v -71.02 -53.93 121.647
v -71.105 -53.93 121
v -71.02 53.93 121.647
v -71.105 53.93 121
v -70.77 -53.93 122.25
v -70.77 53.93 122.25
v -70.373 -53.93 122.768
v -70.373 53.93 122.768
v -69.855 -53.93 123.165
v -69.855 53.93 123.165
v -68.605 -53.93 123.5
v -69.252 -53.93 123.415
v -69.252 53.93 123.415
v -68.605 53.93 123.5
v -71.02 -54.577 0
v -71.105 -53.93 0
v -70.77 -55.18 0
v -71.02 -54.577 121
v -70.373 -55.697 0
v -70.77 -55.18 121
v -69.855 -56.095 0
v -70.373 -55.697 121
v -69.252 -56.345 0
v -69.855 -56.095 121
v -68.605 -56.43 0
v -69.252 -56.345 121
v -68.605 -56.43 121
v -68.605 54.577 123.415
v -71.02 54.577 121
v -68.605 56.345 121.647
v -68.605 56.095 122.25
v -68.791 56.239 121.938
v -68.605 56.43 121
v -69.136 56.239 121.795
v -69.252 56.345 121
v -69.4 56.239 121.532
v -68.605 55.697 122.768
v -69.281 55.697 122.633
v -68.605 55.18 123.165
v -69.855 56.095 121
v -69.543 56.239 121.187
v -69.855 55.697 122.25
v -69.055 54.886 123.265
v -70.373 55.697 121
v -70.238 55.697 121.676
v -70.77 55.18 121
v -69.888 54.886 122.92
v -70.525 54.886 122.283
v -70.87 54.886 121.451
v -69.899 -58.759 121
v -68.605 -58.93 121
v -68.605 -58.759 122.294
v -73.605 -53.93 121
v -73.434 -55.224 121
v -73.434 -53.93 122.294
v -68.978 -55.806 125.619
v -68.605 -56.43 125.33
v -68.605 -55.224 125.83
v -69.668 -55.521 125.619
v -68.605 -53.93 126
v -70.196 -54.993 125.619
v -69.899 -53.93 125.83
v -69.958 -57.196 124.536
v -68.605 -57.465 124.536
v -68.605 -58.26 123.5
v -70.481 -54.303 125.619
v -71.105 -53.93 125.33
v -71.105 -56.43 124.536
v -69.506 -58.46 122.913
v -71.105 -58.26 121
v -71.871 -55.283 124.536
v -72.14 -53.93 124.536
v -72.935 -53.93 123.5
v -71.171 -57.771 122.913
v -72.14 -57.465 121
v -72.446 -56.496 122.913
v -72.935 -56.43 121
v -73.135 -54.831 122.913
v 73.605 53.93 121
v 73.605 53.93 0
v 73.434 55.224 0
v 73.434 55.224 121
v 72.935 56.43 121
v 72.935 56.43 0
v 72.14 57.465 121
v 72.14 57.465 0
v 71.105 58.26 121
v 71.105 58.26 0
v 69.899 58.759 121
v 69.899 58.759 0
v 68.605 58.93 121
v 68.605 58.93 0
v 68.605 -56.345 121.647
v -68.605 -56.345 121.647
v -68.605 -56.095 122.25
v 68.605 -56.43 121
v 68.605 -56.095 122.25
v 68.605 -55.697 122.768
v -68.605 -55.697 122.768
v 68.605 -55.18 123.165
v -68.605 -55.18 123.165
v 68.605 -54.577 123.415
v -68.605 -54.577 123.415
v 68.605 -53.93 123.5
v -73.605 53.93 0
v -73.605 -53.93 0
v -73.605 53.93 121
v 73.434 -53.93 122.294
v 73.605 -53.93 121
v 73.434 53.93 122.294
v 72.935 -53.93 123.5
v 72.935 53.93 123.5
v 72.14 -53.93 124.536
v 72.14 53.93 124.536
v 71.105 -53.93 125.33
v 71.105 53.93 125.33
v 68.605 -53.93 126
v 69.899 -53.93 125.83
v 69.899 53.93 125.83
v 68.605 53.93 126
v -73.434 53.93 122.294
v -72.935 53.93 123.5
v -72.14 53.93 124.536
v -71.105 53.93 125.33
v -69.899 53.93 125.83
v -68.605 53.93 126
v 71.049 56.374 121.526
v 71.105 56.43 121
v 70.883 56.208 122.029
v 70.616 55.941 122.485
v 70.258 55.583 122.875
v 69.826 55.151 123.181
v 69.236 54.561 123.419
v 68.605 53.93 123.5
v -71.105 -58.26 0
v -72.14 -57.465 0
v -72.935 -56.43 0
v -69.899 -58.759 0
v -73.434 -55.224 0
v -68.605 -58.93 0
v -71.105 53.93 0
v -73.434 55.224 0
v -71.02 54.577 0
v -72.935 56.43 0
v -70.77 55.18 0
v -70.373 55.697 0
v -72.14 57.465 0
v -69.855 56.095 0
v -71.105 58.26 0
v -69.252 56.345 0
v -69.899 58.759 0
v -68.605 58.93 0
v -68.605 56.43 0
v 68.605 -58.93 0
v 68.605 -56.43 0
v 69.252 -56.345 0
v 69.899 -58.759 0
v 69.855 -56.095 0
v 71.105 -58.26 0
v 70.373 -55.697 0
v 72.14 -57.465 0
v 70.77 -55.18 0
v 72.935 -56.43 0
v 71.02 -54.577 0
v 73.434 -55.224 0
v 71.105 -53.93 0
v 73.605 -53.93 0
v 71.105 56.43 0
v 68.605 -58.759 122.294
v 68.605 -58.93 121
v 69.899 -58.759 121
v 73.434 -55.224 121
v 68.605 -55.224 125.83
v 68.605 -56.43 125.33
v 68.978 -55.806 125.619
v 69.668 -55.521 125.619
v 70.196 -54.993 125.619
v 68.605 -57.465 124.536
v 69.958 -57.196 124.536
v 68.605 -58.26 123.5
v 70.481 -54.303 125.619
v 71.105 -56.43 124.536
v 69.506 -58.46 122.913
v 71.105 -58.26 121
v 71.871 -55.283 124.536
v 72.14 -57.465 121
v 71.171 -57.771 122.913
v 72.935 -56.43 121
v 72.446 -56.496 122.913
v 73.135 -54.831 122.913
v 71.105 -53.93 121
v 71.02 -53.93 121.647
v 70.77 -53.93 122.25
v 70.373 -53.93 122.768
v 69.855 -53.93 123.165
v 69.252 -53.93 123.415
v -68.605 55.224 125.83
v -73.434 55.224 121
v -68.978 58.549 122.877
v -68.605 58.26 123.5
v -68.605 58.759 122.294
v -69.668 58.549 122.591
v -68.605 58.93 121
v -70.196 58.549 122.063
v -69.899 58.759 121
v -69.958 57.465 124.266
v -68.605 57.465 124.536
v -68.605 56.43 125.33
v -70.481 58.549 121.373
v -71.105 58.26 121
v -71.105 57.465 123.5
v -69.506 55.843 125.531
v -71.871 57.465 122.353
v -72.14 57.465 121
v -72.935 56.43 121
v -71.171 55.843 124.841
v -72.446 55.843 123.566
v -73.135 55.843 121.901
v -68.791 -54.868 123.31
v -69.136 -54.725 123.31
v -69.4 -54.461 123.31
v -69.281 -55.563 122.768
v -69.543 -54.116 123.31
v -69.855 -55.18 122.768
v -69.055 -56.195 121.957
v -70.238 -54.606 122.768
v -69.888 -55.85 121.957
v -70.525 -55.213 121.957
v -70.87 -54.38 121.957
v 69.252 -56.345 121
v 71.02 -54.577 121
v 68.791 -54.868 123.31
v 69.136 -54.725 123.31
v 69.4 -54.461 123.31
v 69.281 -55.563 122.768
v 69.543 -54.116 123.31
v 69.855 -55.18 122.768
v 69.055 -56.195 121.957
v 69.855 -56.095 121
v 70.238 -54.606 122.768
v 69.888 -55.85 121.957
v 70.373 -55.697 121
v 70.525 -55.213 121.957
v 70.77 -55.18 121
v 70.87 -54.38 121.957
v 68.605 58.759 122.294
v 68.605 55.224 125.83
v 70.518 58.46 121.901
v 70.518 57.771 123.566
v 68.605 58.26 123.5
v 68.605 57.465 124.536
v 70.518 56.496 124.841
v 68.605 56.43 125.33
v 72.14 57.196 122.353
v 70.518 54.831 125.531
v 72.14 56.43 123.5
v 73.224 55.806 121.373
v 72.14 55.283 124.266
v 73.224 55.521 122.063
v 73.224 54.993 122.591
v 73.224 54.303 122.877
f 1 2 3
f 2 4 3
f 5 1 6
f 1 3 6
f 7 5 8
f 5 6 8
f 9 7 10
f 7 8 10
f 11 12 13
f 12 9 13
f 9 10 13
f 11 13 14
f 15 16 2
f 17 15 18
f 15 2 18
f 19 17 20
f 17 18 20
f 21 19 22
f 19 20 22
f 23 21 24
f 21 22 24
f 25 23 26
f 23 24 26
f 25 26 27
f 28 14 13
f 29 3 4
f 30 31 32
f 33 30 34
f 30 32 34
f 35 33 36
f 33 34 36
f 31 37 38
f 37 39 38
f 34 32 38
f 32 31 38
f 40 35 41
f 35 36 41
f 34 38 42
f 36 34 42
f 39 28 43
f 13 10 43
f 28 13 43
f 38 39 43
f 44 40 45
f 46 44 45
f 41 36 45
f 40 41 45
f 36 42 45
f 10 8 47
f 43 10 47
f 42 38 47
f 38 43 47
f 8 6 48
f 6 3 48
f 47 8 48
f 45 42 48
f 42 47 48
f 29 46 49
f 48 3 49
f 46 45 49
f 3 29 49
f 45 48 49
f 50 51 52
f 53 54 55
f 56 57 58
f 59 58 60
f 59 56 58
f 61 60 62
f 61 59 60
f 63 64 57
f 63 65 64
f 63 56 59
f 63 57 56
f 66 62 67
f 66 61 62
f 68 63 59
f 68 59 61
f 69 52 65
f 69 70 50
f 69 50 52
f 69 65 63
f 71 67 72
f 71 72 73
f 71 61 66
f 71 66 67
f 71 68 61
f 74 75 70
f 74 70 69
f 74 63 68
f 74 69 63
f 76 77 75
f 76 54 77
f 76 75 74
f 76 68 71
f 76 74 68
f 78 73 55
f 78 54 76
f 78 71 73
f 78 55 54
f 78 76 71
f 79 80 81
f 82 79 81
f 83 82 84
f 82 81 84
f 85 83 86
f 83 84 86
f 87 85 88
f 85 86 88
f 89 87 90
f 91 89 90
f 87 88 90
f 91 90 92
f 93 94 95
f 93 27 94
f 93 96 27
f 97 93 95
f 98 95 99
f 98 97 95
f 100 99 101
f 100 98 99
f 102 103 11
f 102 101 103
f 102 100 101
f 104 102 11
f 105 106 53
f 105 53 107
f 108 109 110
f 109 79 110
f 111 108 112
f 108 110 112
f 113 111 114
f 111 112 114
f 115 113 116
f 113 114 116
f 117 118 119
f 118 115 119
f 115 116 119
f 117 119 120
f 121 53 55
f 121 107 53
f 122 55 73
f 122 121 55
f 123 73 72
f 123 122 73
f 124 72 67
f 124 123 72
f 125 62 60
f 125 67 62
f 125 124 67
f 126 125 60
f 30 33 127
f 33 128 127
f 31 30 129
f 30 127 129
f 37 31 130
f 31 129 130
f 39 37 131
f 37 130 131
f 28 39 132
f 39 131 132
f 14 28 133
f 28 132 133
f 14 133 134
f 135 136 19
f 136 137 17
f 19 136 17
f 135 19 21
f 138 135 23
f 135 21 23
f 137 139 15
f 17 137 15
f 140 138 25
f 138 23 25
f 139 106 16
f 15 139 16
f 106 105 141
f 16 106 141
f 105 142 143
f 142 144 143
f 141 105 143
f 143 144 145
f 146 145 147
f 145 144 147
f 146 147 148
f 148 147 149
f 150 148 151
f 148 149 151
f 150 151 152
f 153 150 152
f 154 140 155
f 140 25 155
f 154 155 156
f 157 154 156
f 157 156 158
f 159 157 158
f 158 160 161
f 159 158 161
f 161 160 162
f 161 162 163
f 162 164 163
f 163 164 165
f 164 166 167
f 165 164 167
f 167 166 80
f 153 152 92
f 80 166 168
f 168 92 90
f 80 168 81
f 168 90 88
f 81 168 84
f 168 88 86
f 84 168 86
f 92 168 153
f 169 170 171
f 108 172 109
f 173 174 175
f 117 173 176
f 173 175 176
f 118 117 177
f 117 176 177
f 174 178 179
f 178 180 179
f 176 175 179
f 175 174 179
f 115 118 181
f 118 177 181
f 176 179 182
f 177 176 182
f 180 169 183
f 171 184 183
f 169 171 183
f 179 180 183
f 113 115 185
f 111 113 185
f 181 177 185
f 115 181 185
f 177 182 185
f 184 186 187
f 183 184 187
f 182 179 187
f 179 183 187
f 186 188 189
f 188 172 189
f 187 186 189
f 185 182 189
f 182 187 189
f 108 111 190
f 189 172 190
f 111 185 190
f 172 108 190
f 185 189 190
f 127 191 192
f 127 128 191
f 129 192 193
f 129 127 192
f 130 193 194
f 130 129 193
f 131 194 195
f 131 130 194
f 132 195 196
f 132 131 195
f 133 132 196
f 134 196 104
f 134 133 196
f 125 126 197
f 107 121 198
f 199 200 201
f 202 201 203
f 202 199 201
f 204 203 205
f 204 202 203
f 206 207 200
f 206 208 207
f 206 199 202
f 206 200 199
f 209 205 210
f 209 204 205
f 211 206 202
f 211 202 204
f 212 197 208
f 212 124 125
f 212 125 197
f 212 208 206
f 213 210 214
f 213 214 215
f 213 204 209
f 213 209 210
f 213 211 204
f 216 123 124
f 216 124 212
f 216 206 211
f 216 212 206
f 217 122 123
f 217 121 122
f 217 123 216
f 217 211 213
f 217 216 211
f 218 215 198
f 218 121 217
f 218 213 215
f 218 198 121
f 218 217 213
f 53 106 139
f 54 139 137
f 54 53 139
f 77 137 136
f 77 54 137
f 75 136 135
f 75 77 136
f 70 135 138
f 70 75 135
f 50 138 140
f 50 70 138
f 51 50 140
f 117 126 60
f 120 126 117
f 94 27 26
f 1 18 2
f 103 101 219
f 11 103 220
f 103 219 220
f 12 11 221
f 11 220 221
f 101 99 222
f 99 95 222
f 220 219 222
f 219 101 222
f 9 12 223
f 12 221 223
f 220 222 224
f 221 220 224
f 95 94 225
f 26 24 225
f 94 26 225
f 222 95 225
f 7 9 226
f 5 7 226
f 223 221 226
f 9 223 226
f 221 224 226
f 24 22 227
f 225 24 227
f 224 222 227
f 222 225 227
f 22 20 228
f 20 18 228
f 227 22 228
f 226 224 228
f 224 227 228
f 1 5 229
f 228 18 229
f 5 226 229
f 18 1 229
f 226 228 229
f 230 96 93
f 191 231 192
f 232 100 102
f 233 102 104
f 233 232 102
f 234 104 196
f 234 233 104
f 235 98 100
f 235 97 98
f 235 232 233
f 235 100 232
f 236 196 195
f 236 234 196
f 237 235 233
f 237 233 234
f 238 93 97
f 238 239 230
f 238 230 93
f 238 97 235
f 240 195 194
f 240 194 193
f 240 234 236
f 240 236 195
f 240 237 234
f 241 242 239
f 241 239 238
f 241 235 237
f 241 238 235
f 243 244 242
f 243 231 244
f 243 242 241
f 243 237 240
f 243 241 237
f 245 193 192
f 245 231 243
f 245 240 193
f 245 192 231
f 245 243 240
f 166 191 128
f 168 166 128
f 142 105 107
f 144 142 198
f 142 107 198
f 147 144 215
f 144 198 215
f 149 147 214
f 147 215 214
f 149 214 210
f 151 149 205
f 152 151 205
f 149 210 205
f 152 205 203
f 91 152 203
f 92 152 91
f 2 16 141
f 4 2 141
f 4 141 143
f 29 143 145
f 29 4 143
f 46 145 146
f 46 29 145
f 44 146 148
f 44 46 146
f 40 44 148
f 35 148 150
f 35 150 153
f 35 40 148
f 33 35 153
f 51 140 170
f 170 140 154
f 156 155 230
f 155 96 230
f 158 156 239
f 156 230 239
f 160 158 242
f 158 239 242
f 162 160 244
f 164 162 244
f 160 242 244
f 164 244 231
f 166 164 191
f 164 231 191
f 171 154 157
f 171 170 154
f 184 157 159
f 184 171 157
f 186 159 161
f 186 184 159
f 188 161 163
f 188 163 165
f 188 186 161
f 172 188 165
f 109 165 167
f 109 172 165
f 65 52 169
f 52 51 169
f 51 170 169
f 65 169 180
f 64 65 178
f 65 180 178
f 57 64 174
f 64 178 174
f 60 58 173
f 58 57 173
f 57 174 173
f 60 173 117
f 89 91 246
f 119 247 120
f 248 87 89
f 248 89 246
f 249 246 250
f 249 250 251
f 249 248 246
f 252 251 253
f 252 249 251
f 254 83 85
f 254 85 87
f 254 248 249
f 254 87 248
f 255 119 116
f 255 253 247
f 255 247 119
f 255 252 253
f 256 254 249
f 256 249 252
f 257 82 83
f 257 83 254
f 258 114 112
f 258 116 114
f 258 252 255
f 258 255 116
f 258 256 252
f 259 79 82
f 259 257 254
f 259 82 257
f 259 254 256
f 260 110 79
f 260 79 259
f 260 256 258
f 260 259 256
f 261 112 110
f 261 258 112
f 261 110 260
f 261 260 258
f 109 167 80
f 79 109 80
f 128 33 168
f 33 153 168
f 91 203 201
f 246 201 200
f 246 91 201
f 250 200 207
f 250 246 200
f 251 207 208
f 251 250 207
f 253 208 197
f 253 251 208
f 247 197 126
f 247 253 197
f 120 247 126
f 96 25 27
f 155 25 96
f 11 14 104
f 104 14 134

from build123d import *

# Parameters (mm, degrees)
F0_W        = 147.209584713
F0_H        = 117.8593859076
F1_DEPTH    = 126
F2_R        = 5
F3_T        = -2.5
F4_T1_DEPTH = 133.5
F4_S5_W     = 5
F4_S5_H     = 5
F4_T6_DEPTH = 5


# Not quite as in the source:
# - a fillet or chamfer that OpenCascade refuses, or shapes differently, is made with other operations: its cross-section is extruded or revolved along the edge and cut away or added


with BuildPart() as f1:
    # F0 (on Top) → F1 (new body)
    with BuildSketch(Plane.XY):
        Rectangle(F0_W, F0_H)
    extrude(amount=F1_DEPTH)

    # F2
    f2_edges = [f1.edges().sort_by_distance(p)[0] for p in [
        (-73.604792, -58.929693, 63),
        (73.604792, -58.929693, 63),
        (0, -58.929693, 126),
        (-73.604792, 0, 126),
        (0, 58.929693, 126),
        (73.604792, 0, 126),
        (-73.604792, 58.929693, 63),
    ]]
    fillet(f2_edges, radius=F2_R)

    # F3
    f3_openings = [f1.faces().sort_by_distance(p)[0] for p in [
        (0.022436, 0.017894, 0),
    ]]
    offset(amount=F3_T, openings=f3_openings)

    # F4: fillet of radius 5 on 1 edges, made by hand

    # F4_s2 → F4_t1 (cut)
    with BuildSketch(Plane.XY.offset(-12.5)):
        with BuildLine():
            ThreePointArc((73.6047923565, 53.9296929538), (72.1403262624, 57.4652268598), (68.6047923565, 58.9296929538))
            Line((68.6047923565, 58.9296929538), (73.6047923565, 58.9296929538))
            Line((73.6047923565, 58.9296929538), (73.6047923565, 53.9296929538))
        make_face()
    extrude(amount=F4_T1_DEPTH, mode=Mode.SUBTRACT)


with BuildPart() as f4_tool4:
    # F4_s5 → F4_t6 (new body)
    with BuildSketch(Plane.YZ.offset(68.6047923565)):
        with Locations((56.4296929538, 123.5)):
            Rectangle(F4_S5_W, F4_S5_H)
    extrude(amount=F4_T6_DEPTH)

    # F4_s7 → F4_t8 (revolve, cut)
    with BuildSketch(Plane(origin=(68.6047923565, 53.9296929538, 121), x_dir=(0, -0.7071067812, -0.7071067812), z_dir=(0, -0.7071067812, 0.7071067812))):
        with BuildLine():
            ThreePointArc((0, -5), (5, 0), (0, 5))
            Line((0, 5), (0, -5))
        make_face()
    revolve(axis=Axis((68.6047923565, 53.9296929538, 121), (1, 0, 0)), mode=Mode.SUBTRACT)


with BuildPart() as f1_1:
    add(f1.part)

    # F4_t3: cut F4_tool4
    add(f4_tool4.part, mode=Mode.SUBTRACT)


solid = f1_1.part
